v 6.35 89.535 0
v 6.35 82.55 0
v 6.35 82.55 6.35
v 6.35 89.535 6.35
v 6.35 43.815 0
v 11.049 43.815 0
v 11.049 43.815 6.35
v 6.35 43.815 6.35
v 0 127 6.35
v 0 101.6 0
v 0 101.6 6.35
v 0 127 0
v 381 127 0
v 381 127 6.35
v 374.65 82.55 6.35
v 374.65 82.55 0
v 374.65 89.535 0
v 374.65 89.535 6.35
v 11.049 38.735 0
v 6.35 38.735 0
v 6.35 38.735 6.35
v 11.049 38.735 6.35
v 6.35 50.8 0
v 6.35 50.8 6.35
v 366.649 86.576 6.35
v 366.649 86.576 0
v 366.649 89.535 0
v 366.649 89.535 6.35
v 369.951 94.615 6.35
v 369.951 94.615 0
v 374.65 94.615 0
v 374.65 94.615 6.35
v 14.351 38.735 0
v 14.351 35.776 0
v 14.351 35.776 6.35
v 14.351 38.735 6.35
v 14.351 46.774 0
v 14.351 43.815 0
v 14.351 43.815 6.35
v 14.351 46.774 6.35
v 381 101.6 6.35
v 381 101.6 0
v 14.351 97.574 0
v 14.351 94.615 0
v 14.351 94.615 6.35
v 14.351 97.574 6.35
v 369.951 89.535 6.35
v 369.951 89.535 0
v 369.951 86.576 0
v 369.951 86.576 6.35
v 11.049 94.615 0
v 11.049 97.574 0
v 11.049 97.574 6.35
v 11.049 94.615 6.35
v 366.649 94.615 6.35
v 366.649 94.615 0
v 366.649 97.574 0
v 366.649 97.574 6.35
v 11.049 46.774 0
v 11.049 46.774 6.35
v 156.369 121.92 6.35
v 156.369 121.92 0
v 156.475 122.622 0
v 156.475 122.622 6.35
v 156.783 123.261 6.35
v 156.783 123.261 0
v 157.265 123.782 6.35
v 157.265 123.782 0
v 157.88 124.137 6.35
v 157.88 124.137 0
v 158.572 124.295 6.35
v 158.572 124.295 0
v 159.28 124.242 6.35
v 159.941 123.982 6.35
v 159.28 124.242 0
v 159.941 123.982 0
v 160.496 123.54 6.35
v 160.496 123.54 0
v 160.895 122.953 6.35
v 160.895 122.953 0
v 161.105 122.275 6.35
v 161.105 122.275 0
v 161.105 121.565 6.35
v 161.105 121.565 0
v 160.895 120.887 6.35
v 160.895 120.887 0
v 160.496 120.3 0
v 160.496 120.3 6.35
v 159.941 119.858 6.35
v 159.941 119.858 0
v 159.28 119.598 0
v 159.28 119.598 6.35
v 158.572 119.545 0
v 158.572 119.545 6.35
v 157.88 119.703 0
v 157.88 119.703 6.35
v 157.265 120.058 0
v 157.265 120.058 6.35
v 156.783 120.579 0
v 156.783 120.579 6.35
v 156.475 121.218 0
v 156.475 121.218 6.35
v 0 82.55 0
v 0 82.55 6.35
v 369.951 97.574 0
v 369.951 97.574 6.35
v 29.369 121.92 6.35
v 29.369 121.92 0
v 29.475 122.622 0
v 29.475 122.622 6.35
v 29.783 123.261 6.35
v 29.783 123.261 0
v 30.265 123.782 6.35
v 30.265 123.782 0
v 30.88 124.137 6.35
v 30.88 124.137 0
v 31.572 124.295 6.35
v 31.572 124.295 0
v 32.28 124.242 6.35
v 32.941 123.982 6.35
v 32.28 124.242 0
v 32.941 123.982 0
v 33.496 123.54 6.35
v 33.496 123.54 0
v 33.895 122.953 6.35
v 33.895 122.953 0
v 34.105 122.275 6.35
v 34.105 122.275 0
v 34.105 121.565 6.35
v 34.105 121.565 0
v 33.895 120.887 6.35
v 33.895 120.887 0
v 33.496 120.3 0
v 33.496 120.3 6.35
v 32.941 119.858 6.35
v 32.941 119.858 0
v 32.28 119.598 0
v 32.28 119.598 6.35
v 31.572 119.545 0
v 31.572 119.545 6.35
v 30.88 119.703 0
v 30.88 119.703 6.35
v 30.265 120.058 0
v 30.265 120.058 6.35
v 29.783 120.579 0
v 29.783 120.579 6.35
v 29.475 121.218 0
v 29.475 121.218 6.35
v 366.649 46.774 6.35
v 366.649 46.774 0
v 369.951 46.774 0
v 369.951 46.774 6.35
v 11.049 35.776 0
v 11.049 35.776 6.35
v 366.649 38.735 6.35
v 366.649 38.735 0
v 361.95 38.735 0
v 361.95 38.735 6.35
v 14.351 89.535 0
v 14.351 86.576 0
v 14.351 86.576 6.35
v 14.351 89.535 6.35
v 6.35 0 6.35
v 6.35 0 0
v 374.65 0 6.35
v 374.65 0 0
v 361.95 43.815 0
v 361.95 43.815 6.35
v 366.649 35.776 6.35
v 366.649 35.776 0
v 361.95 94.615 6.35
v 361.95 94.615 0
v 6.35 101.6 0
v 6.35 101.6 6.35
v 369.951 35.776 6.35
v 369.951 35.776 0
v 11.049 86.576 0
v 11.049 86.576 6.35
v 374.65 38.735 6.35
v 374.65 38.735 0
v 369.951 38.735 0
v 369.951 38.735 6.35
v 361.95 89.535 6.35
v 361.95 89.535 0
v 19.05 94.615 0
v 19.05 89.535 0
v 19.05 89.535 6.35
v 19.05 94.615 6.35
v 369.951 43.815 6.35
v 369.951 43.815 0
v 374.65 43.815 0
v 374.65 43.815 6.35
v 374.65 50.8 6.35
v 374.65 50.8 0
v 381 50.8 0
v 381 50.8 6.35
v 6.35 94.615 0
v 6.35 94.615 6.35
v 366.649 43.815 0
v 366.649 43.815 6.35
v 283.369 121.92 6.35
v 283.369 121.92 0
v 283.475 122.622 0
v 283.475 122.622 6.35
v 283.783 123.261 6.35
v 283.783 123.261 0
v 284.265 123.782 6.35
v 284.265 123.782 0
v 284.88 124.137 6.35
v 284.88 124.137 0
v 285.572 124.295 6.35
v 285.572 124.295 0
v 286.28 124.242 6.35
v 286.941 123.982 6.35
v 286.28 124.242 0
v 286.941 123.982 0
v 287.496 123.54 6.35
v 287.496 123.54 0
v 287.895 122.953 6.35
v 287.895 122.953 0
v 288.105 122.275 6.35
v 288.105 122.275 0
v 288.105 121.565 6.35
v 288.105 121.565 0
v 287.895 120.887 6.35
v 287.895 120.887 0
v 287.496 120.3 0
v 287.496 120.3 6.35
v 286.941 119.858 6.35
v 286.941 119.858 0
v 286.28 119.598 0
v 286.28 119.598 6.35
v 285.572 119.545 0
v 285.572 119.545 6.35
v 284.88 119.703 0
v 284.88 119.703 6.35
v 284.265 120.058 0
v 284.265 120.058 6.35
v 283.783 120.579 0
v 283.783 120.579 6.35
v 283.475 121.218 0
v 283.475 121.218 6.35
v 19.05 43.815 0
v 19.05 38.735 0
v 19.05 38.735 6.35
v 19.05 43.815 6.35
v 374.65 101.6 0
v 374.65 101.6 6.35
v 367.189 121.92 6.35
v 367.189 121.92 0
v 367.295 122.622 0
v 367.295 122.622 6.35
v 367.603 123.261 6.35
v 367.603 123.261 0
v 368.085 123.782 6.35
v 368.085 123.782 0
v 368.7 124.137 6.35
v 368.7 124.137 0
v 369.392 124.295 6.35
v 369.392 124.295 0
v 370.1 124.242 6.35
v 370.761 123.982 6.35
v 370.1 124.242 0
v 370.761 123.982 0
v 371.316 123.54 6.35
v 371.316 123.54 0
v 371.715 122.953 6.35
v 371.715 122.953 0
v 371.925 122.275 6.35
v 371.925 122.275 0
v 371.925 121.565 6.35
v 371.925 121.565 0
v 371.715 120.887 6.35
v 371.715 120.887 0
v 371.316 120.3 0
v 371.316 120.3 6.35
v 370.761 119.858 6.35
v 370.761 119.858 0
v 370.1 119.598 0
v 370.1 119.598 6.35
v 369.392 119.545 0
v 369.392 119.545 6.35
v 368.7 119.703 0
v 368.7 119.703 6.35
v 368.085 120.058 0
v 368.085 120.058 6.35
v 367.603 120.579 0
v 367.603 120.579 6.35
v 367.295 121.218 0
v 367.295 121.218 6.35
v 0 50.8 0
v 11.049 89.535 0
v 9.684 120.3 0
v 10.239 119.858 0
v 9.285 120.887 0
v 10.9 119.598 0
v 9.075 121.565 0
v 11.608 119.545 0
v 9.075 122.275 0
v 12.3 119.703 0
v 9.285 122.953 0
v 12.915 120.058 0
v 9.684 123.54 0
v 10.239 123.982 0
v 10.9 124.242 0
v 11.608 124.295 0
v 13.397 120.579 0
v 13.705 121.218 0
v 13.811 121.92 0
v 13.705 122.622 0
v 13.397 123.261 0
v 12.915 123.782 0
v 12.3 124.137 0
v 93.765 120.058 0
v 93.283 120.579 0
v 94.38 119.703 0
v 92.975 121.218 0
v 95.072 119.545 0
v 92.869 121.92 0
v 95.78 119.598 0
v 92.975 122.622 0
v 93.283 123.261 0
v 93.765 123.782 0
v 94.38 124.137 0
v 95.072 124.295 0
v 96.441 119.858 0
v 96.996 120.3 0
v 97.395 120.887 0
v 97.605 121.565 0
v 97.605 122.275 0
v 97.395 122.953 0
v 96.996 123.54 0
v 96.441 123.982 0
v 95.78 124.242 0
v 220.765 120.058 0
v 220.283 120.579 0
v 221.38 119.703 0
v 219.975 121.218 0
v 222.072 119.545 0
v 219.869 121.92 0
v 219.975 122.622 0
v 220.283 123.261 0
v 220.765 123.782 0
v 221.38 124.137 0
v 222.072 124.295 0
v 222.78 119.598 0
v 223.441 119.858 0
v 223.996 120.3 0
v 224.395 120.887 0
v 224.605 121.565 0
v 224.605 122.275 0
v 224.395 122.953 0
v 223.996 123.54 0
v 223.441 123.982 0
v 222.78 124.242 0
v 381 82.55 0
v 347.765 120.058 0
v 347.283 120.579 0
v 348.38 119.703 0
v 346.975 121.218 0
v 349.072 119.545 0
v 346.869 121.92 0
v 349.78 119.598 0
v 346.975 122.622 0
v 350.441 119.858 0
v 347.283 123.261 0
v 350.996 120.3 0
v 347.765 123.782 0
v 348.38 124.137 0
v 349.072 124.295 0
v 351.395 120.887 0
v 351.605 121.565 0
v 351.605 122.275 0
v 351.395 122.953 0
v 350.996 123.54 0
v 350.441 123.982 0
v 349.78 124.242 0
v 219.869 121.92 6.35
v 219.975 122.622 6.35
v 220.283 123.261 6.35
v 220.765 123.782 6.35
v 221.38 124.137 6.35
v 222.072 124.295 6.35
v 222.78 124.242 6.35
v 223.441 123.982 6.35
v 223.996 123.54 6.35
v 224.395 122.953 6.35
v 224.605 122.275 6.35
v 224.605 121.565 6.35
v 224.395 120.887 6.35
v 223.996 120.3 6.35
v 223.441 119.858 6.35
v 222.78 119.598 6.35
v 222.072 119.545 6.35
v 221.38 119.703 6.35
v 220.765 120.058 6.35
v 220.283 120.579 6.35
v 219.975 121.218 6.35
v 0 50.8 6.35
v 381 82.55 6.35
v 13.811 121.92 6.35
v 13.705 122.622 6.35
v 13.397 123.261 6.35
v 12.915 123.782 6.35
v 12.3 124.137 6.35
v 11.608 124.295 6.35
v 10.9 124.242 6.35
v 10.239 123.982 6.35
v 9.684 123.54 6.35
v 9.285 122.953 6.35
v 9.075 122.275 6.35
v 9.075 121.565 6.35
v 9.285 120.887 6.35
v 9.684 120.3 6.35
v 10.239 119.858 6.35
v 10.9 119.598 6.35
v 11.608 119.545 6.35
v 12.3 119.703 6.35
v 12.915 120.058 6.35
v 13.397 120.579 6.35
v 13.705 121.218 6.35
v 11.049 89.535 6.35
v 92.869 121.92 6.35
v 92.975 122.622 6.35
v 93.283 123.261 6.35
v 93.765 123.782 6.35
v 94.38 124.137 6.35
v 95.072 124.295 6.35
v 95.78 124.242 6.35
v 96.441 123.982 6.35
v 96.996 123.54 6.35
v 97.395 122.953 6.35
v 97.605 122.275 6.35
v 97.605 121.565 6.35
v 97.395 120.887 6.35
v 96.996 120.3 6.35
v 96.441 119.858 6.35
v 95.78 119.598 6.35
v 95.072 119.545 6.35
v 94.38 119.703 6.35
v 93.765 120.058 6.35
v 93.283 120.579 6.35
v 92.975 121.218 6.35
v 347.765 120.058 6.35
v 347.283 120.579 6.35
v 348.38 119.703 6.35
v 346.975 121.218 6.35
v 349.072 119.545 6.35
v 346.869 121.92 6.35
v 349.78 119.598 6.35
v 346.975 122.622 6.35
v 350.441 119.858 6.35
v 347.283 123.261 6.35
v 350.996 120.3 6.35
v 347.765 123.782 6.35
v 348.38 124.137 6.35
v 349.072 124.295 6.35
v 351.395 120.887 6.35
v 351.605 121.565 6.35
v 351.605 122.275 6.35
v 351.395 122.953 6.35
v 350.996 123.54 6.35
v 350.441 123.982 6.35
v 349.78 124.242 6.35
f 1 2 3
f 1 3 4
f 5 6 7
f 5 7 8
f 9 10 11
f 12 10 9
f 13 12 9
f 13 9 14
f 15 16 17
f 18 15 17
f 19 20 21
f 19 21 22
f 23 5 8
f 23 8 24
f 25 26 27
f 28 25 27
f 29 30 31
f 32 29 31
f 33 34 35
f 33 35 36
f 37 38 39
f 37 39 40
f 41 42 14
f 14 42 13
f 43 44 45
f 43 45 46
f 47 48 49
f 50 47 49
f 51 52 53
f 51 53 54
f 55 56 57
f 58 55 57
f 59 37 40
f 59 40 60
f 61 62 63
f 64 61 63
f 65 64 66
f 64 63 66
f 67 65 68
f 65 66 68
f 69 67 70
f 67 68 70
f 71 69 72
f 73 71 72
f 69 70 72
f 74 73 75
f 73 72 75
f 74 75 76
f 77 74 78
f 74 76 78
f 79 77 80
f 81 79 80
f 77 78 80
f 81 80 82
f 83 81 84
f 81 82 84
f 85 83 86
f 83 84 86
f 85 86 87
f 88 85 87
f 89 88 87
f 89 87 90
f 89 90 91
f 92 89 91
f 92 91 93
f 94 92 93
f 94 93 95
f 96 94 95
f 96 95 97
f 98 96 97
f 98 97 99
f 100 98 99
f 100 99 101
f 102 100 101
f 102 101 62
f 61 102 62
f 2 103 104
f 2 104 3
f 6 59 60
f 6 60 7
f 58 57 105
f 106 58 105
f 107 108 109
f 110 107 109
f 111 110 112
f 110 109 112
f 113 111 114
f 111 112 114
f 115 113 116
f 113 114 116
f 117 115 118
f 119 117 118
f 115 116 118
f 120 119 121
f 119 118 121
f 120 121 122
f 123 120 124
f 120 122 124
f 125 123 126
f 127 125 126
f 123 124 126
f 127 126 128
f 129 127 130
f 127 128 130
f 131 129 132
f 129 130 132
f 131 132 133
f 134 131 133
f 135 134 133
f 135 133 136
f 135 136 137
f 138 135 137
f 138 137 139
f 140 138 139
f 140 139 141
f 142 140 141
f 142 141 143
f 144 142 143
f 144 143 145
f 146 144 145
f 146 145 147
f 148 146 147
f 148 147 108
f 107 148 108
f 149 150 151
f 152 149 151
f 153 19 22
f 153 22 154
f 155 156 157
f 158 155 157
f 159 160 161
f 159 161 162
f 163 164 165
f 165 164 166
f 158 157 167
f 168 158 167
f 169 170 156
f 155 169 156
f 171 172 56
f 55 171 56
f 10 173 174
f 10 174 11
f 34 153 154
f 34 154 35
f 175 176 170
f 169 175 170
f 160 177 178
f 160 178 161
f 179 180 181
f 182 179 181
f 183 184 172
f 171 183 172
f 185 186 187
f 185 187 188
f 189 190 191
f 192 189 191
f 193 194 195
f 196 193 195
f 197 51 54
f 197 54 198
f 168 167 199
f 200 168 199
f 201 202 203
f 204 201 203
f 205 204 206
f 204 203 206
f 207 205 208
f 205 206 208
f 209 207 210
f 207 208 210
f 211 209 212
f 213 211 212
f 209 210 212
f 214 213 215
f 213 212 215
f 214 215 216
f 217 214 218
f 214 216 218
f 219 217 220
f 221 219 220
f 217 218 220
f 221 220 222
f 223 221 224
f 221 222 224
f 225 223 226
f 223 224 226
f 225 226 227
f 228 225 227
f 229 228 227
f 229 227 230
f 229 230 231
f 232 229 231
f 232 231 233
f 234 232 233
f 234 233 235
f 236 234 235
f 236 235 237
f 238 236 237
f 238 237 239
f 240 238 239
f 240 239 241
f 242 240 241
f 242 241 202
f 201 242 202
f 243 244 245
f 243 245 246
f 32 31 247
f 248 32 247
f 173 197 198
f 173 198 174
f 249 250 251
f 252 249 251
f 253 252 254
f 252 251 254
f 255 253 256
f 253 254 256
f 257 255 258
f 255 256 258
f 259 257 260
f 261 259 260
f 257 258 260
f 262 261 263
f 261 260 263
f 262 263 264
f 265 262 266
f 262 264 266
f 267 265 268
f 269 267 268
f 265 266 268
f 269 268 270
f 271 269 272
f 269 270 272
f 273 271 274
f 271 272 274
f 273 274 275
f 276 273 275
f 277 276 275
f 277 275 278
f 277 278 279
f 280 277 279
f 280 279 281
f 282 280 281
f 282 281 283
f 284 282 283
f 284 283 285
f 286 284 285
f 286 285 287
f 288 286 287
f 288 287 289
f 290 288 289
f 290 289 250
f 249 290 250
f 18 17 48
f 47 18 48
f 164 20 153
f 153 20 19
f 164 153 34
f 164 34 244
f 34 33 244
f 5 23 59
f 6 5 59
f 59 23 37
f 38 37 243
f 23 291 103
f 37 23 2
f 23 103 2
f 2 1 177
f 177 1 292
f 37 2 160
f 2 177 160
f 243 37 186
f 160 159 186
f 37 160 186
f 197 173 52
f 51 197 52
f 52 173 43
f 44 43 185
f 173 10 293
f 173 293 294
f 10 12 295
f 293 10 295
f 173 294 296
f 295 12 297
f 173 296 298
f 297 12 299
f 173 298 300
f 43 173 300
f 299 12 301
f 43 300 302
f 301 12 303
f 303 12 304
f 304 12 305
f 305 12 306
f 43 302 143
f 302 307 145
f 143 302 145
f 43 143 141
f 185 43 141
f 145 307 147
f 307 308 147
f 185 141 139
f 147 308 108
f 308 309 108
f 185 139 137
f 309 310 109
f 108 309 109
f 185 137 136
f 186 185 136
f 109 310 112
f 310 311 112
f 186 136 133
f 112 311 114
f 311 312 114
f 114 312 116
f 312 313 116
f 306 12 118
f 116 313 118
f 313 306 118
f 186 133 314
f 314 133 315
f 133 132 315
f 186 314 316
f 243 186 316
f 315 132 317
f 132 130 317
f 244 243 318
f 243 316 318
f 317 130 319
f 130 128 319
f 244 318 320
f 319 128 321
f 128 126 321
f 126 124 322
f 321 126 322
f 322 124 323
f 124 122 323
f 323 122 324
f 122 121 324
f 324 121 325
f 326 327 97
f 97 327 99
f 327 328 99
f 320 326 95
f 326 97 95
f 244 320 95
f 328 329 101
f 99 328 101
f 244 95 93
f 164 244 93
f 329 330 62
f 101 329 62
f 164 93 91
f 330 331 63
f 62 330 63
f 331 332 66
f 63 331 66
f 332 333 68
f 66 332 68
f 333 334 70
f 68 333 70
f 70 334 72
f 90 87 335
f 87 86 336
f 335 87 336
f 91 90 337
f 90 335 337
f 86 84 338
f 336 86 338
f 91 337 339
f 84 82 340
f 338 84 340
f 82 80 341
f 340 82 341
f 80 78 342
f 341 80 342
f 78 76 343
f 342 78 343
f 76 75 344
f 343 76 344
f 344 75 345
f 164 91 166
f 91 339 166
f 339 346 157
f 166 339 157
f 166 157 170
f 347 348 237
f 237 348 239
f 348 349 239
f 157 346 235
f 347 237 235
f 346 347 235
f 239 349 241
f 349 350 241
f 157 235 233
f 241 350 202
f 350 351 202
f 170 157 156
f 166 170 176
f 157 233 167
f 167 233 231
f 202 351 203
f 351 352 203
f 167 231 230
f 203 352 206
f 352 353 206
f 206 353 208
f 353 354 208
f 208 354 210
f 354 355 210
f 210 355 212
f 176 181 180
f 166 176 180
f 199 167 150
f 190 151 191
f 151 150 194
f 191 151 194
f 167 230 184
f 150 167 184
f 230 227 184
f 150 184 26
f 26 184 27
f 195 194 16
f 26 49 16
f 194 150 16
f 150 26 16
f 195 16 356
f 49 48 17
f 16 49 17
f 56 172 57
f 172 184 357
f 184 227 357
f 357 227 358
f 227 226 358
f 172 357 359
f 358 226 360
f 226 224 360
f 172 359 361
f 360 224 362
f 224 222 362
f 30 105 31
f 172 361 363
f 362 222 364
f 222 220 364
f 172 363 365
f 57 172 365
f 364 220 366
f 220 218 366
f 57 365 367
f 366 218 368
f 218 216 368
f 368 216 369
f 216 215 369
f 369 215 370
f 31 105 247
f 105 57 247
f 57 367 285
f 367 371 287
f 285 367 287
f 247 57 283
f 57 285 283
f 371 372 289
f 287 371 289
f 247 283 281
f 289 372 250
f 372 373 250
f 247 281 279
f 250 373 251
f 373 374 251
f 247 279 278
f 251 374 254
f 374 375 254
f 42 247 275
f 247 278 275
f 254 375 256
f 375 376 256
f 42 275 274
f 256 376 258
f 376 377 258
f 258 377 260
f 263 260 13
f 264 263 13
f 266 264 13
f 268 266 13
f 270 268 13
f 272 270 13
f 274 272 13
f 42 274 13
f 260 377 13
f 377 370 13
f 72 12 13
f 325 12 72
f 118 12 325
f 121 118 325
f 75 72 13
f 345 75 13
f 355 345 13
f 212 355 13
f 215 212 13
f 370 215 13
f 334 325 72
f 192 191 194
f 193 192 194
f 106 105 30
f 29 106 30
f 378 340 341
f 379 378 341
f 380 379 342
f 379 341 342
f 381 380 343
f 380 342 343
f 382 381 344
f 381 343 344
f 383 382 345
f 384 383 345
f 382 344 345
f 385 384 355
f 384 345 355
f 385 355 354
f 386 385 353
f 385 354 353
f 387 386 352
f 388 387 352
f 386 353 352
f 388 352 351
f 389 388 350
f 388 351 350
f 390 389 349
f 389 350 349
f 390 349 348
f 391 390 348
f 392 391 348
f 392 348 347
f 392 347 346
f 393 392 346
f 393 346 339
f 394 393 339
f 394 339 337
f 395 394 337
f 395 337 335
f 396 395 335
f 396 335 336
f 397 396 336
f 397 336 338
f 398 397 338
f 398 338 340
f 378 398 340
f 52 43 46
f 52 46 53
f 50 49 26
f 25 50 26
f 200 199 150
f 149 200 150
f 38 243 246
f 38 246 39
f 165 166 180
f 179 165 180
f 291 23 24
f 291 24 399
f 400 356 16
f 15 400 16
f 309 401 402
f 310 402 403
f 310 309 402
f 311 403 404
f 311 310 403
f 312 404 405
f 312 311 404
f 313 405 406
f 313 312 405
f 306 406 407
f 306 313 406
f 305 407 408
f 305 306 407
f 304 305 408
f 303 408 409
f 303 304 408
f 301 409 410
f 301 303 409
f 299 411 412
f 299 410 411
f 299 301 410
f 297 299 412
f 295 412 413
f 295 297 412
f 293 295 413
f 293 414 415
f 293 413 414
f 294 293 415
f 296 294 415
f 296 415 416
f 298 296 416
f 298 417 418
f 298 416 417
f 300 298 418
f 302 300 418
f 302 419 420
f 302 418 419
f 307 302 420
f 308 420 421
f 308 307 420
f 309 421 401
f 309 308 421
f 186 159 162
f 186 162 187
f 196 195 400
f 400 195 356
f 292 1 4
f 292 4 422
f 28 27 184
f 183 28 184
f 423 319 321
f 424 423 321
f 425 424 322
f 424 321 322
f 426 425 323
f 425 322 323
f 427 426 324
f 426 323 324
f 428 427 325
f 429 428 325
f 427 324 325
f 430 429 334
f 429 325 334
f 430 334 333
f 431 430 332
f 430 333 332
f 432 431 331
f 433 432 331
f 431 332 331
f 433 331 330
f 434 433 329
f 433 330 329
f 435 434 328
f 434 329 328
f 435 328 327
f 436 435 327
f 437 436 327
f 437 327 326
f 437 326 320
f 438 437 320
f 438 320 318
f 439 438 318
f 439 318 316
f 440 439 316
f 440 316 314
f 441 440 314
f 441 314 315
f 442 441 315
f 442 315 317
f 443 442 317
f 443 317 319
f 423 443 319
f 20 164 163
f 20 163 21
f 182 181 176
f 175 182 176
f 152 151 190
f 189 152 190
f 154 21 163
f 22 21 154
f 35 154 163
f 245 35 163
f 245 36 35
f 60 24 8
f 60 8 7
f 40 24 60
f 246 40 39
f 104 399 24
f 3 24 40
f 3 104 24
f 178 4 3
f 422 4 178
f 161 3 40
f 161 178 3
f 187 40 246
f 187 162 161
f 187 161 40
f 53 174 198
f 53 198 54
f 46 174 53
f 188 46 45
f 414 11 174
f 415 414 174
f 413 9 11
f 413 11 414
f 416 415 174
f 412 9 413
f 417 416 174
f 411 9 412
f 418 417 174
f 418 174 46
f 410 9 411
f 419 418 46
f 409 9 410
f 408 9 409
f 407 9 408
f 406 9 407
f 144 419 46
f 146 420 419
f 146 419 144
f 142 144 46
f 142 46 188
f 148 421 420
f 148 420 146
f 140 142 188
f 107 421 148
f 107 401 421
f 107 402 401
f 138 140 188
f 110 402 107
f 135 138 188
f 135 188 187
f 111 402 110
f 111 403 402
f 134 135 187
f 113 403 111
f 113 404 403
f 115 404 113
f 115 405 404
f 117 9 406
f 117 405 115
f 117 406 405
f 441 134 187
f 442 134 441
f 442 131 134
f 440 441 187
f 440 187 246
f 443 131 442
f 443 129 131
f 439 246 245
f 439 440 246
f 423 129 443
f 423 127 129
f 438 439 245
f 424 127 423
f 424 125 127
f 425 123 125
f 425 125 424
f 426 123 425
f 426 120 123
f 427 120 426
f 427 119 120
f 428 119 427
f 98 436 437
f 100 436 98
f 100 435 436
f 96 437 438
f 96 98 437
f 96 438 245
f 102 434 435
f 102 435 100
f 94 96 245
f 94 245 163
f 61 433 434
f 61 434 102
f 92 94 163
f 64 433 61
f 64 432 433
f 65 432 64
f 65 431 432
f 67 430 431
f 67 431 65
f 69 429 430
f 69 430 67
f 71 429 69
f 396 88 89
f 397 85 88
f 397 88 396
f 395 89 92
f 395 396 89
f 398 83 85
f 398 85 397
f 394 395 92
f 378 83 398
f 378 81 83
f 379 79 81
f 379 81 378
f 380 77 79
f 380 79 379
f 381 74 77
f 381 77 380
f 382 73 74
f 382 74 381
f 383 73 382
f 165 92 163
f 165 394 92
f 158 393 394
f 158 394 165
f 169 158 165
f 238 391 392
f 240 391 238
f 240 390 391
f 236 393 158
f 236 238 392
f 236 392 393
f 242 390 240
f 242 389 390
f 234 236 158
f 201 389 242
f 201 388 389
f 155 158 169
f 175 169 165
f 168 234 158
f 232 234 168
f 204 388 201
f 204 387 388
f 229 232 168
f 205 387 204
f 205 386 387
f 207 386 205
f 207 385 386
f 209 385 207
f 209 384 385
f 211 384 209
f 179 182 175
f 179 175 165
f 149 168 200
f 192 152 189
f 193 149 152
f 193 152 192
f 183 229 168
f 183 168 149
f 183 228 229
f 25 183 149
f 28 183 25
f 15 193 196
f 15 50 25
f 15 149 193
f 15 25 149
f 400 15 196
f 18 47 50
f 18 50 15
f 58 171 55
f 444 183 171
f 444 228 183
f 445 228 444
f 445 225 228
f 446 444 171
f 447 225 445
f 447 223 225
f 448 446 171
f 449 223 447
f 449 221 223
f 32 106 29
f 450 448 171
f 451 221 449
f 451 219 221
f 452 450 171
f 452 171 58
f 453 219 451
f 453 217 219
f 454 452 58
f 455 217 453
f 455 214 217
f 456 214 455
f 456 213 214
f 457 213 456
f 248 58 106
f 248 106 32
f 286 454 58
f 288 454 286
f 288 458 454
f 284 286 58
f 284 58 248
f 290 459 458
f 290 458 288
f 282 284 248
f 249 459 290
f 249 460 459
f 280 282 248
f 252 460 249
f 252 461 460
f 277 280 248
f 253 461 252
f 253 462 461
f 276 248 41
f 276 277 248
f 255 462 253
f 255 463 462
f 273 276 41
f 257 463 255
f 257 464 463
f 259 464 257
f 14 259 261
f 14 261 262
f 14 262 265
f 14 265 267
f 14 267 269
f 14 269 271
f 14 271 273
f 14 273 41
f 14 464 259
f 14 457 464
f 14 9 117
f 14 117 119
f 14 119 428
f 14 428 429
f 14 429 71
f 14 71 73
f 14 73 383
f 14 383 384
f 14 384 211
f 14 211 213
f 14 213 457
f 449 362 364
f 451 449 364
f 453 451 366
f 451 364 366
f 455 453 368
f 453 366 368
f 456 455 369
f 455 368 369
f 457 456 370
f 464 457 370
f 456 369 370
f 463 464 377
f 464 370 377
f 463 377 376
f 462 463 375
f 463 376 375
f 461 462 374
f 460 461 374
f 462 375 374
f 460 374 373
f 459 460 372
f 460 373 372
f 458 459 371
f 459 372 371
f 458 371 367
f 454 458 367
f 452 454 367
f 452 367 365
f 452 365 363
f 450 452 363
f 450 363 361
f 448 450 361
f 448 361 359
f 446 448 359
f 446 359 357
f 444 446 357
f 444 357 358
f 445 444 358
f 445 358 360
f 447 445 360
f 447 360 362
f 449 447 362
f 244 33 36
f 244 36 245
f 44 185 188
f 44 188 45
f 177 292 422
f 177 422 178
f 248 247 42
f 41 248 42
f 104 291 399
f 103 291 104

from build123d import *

# Parameters (mm, degrees)
SKETCH2_W            = 381
SKETCH2_H            = 127
BOSS_EXTRUDE1_DEPTH  = 6.35
CUT_EXTRUDE3_DEPTH   = 402.659460862
LPATTERN1_COUNT      = 2
LPATTERN1_PITCH      = 50.8
MIRROR1_COPY_1_DEPTH = 402.659460862
SKETCH6_R            = 2.38125
CUT_EXTRUDE4_DEPTH   = 402.659460862
LPATTERN2_COUNT      = 6
LPATTERN2_PITCH      = 63.5
SKETCH7_R            = 2.38125
CUT_EXTRUDE5_DEPTH   = 402.659460862
SKETCH8_W            = 6.35
SKETCH8_H            = 31.75
CUT_EXTRUDE6_DEPTH   = 402.659460862


with BuildPart() as part:
    # Sketch2 → Boss-Extrude1 (new body)
    with BuildSketch(Plane.XY):
        with Locations((190.5, 63.5)):
            Rectangle(SKETCH2_W, SKETCH2_H)
    extrude(amount=BOSS_EXTRUDE1_DEPTH)

    # Sketch5 → Cut-Extrude3 (cut, through all)
    with BuildSketch(Plane(origin=(0, 0, 0), x_dir=(-1, 0, 0), z_dir=(0, 0, -1))):
        Polygon((-381, 101.6), (-381, 82.55), (-374.65, 82.55), (-374.65, 89.535), (-369.951, 89.535), (-369.951, 86.5759), (-366.649, 86.5759), (-366.649, 89.535), (-361.95, 89.535), (-361.95, 94.615), (-366.649, 94.615), (-366.649, 97.5741), (-369.951, 97.5741), (-369.951, 94.615), (-374.65, 94.615), (-374.65, 101.6), align=None)
    cut_extrude3 = extrude(amount=-CUT_EXTRUDE3_DEPTH, mode=Mode.SUBTRACT)

    # LPattern1: Cut-Extrude3 ×2
    with Locations(*[(0, -i * LPATTERN1_PITCH, 0) for i in range(1, LPATTERN1_COUNT)]):
        add(cut_extrude3, mode=Mode.SUBTRACT)

    # Mirror1: Cut-Extrude3 across plane
    add(cut_extrude3.mirror(Plane.ZY.offset(-190.5)), mode=Mode.SUBTRACT)

    # Mirror1 copy 1 sketch → Mirror1 copy 1 (cut, through all)
    with BuildSketch(Plane(origin=(381, -50.8, 0), x_dir=(1, 0, 0), z_dir=(0, 0, -1))):
        Polygon((-381, -101.6), (-381, -82.55), (-374.65, -82.55), (-374.65, -89.535), (-369.951, -89.535), (-369.951, -86.5759), (-366.649, -86.5759), (-366.649, -89.535), (-361.95, -89.535), (-361.95, -94.615), (-366.649, -94.615), (-366.649, -97.5741), (-369.951, -97.5741), (-369.951, -94.615), (-374.65, -94.615), (-374.65, -101.6), align=None)
    extrude(amount=-MIRROR1_COPY_1_DEPTH, mode=Mode.SUBTRACT)

    # Sketch6 → Cut-Extrude4 (cut, through all)
    with BuildSketch(Plane(origin=(0, 0, 0), x_dir=(-1, 0, 0), z_dir=(0, 0, -1))):
        with Locations((-349.25, 121.92)):
            Circle(SKETCH6_R)
    cut_extrude4 = extrude(amount=-CUT_EXTRUDE4_DEPTH, mode=Mode.SUBTRACT)

    # LPattern2: Cut-Extrude4 ×6
    with Locations(*[(-i * LPATTERN2_PITCH, 0, 0) for i in range(1, LPATTERN2_COUNT)]):
        add(cut_extrude4, mode=Mode.SUBTRACT)

    # Sketch7 → Cut-Extrude5 (cut, through all)
    with BuildSketch(Plane(origin=(0, 0, 0), x_dir=(-1, 0, 0), z_dir=(0, 0, -1))):
        with Locations((-369.57, 121.92)):
            Circle(SKETCH7_R)
    cut_extrude5 = extrude(amount=-CUT_EXTRUDE5_DEPTH, mode=Mode.SUBTRACT)

    # Mirror2: Cut-Extrude5 across plane
    add(cut_extrude5.mirror(Plane.ZY.offset(-190.5)), mode=Mode.SUBTRACT)

    # Sketch8 → Cut-Extrude6 (cut, through all)
    with BuildSketch(Plane(origin=(0, 0, 0), x_dir=(-1, 0, 0), z_dir=(0, 0, -1))):
        with Locations((-377.825, 15.875)):
            Rectangle(SKETCH8_W, SKETCH8_H)
    cut_extrude6 = extrude(amount=-CUT_EXTRUDE6_DEPTH, mode=Mode.SUBTRACT)

    # Mirror3: Cut-Extrude6 across plane
    add(cut_extrude6.mirror(Plane.ZY.offset(-190.5)), mode=Mode.SUBTRACT)


solid = part.part
